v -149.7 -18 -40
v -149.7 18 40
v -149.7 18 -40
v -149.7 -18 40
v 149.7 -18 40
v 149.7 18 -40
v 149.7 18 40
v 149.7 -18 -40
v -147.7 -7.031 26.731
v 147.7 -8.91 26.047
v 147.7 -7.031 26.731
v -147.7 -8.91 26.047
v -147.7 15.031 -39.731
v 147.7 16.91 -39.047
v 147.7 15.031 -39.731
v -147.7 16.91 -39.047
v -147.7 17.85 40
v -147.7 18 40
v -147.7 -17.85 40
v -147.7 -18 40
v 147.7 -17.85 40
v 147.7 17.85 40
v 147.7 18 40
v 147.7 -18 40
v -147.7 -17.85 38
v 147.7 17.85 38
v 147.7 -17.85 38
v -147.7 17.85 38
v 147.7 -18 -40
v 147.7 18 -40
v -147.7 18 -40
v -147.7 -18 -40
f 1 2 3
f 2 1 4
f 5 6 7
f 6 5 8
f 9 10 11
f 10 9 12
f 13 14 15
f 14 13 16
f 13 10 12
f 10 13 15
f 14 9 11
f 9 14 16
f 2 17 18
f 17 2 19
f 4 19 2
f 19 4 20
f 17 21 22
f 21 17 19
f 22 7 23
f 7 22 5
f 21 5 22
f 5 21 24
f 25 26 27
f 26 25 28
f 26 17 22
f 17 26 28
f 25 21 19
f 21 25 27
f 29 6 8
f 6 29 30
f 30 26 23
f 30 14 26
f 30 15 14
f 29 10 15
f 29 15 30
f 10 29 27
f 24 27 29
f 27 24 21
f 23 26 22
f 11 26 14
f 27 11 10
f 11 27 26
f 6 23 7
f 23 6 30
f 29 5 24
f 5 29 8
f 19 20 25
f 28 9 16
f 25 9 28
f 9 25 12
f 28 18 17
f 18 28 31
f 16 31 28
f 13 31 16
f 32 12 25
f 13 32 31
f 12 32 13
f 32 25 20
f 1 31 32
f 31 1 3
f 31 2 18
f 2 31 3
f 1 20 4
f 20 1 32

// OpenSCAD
w = 300;
h = 40;
d = 80;
t = 2;
rim = 16;
x = 24;
tol=0.3;

//outer();
inner();

module outer() {
    union() {
        difference() {
            union() {
                cube([w, h, d], center=true); 
                translate([0, 0, -d/2 + t/2])cube([w + rim, h + rim, t], center=true); 
            }
            cube([w - t*2, h - t*2 , d], center=true); 
            for(v = [-w/2 + 1.5*x: 1.5 * x : w/2 - 1.5*x]) {
                translate([v, h/2, - d/2  + x] ) cube([x, t, x], center=true); 
            }
        }
    }
}


module inner() {
    difference() {
        union() {
            translate([0, 4, -10/2 -1.5]) rotate([20, 0, 0]) cube([w - 2*tol, t, d - 10], center=true); 
            translate([0, 0, d/2 - t/2]) cube([w - t*2, h - t*2-tol, t], center=true); 
            translate([w/2 - t/2 -tol, 0, 0]) cube([t, h -t*2, d], center=true); 
            translate([-w/2 + t/2 + tol, 0, 0]) cube([t, h -t*2, d], center=true); 
        }
    }
}
